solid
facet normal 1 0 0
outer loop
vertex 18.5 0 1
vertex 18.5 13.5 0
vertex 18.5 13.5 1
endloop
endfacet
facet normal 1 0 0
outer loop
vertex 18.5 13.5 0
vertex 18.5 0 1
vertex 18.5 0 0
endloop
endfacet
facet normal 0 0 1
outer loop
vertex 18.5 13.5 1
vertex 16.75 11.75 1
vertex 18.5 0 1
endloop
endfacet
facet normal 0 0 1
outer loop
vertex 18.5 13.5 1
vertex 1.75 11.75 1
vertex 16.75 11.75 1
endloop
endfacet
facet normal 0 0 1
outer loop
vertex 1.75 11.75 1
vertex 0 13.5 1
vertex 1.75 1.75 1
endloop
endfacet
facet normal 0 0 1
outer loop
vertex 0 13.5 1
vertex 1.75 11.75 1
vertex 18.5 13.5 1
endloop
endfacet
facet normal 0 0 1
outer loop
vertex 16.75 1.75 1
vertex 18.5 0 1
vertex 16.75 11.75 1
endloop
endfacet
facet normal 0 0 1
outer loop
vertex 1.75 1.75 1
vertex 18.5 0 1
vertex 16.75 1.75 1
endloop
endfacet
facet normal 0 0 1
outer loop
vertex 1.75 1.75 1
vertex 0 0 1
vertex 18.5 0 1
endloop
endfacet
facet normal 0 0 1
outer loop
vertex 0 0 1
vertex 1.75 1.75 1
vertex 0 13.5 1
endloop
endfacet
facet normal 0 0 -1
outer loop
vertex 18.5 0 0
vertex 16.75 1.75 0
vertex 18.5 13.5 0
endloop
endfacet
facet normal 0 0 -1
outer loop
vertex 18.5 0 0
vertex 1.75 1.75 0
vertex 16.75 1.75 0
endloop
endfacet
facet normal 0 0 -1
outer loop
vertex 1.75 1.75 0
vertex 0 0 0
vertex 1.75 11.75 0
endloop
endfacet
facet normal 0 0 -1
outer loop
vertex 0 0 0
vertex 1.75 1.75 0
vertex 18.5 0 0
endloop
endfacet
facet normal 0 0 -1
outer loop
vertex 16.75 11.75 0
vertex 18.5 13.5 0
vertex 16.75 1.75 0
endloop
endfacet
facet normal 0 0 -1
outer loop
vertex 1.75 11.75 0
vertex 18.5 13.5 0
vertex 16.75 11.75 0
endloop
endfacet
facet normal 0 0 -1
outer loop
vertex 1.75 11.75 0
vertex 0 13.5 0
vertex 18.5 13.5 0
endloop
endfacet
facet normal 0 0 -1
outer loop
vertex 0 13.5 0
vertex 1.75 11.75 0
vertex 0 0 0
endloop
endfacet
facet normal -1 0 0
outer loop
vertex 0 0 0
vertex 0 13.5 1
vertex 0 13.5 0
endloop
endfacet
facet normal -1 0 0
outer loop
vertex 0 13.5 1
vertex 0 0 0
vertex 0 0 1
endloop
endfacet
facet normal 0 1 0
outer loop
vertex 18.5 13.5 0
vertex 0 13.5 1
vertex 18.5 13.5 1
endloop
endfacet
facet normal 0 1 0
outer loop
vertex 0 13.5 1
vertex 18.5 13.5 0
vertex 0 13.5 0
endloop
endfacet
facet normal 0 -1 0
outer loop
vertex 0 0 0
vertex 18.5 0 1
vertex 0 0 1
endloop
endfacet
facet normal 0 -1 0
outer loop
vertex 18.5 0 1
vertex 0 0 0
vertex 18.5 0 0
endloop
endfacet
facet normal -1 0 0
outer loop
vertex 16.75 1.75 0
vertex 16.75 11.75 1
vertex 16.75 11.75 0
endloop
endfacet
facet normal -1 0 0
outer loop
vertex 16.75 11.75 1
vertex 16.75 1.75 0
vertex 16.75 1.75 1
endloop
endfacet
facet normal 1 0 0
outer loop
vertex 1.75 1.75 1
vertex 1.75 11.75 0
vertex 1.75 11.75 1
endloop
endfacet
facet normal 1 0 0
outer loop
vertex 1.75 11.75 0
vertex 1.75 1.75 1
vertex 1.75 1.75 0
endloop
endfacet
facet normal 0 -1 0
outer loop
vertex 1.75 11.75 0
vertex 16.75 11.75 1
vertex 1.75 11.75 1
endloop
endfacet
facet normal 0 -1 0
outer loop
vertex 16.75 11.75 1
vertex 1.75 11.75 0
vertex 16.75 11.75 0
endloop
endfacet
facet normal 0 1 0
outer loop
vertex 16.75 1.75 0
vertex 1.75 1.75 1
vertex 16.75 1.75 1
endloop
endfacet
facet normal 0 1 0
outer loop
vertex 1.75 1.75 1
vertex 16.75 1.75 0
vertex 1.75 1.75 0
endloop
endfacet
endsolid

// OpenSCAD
difference() {
    cube([18.5,13.5,1]);
    translate([1.75,1.75,-0.5]) cube([15,10,2]);
}
